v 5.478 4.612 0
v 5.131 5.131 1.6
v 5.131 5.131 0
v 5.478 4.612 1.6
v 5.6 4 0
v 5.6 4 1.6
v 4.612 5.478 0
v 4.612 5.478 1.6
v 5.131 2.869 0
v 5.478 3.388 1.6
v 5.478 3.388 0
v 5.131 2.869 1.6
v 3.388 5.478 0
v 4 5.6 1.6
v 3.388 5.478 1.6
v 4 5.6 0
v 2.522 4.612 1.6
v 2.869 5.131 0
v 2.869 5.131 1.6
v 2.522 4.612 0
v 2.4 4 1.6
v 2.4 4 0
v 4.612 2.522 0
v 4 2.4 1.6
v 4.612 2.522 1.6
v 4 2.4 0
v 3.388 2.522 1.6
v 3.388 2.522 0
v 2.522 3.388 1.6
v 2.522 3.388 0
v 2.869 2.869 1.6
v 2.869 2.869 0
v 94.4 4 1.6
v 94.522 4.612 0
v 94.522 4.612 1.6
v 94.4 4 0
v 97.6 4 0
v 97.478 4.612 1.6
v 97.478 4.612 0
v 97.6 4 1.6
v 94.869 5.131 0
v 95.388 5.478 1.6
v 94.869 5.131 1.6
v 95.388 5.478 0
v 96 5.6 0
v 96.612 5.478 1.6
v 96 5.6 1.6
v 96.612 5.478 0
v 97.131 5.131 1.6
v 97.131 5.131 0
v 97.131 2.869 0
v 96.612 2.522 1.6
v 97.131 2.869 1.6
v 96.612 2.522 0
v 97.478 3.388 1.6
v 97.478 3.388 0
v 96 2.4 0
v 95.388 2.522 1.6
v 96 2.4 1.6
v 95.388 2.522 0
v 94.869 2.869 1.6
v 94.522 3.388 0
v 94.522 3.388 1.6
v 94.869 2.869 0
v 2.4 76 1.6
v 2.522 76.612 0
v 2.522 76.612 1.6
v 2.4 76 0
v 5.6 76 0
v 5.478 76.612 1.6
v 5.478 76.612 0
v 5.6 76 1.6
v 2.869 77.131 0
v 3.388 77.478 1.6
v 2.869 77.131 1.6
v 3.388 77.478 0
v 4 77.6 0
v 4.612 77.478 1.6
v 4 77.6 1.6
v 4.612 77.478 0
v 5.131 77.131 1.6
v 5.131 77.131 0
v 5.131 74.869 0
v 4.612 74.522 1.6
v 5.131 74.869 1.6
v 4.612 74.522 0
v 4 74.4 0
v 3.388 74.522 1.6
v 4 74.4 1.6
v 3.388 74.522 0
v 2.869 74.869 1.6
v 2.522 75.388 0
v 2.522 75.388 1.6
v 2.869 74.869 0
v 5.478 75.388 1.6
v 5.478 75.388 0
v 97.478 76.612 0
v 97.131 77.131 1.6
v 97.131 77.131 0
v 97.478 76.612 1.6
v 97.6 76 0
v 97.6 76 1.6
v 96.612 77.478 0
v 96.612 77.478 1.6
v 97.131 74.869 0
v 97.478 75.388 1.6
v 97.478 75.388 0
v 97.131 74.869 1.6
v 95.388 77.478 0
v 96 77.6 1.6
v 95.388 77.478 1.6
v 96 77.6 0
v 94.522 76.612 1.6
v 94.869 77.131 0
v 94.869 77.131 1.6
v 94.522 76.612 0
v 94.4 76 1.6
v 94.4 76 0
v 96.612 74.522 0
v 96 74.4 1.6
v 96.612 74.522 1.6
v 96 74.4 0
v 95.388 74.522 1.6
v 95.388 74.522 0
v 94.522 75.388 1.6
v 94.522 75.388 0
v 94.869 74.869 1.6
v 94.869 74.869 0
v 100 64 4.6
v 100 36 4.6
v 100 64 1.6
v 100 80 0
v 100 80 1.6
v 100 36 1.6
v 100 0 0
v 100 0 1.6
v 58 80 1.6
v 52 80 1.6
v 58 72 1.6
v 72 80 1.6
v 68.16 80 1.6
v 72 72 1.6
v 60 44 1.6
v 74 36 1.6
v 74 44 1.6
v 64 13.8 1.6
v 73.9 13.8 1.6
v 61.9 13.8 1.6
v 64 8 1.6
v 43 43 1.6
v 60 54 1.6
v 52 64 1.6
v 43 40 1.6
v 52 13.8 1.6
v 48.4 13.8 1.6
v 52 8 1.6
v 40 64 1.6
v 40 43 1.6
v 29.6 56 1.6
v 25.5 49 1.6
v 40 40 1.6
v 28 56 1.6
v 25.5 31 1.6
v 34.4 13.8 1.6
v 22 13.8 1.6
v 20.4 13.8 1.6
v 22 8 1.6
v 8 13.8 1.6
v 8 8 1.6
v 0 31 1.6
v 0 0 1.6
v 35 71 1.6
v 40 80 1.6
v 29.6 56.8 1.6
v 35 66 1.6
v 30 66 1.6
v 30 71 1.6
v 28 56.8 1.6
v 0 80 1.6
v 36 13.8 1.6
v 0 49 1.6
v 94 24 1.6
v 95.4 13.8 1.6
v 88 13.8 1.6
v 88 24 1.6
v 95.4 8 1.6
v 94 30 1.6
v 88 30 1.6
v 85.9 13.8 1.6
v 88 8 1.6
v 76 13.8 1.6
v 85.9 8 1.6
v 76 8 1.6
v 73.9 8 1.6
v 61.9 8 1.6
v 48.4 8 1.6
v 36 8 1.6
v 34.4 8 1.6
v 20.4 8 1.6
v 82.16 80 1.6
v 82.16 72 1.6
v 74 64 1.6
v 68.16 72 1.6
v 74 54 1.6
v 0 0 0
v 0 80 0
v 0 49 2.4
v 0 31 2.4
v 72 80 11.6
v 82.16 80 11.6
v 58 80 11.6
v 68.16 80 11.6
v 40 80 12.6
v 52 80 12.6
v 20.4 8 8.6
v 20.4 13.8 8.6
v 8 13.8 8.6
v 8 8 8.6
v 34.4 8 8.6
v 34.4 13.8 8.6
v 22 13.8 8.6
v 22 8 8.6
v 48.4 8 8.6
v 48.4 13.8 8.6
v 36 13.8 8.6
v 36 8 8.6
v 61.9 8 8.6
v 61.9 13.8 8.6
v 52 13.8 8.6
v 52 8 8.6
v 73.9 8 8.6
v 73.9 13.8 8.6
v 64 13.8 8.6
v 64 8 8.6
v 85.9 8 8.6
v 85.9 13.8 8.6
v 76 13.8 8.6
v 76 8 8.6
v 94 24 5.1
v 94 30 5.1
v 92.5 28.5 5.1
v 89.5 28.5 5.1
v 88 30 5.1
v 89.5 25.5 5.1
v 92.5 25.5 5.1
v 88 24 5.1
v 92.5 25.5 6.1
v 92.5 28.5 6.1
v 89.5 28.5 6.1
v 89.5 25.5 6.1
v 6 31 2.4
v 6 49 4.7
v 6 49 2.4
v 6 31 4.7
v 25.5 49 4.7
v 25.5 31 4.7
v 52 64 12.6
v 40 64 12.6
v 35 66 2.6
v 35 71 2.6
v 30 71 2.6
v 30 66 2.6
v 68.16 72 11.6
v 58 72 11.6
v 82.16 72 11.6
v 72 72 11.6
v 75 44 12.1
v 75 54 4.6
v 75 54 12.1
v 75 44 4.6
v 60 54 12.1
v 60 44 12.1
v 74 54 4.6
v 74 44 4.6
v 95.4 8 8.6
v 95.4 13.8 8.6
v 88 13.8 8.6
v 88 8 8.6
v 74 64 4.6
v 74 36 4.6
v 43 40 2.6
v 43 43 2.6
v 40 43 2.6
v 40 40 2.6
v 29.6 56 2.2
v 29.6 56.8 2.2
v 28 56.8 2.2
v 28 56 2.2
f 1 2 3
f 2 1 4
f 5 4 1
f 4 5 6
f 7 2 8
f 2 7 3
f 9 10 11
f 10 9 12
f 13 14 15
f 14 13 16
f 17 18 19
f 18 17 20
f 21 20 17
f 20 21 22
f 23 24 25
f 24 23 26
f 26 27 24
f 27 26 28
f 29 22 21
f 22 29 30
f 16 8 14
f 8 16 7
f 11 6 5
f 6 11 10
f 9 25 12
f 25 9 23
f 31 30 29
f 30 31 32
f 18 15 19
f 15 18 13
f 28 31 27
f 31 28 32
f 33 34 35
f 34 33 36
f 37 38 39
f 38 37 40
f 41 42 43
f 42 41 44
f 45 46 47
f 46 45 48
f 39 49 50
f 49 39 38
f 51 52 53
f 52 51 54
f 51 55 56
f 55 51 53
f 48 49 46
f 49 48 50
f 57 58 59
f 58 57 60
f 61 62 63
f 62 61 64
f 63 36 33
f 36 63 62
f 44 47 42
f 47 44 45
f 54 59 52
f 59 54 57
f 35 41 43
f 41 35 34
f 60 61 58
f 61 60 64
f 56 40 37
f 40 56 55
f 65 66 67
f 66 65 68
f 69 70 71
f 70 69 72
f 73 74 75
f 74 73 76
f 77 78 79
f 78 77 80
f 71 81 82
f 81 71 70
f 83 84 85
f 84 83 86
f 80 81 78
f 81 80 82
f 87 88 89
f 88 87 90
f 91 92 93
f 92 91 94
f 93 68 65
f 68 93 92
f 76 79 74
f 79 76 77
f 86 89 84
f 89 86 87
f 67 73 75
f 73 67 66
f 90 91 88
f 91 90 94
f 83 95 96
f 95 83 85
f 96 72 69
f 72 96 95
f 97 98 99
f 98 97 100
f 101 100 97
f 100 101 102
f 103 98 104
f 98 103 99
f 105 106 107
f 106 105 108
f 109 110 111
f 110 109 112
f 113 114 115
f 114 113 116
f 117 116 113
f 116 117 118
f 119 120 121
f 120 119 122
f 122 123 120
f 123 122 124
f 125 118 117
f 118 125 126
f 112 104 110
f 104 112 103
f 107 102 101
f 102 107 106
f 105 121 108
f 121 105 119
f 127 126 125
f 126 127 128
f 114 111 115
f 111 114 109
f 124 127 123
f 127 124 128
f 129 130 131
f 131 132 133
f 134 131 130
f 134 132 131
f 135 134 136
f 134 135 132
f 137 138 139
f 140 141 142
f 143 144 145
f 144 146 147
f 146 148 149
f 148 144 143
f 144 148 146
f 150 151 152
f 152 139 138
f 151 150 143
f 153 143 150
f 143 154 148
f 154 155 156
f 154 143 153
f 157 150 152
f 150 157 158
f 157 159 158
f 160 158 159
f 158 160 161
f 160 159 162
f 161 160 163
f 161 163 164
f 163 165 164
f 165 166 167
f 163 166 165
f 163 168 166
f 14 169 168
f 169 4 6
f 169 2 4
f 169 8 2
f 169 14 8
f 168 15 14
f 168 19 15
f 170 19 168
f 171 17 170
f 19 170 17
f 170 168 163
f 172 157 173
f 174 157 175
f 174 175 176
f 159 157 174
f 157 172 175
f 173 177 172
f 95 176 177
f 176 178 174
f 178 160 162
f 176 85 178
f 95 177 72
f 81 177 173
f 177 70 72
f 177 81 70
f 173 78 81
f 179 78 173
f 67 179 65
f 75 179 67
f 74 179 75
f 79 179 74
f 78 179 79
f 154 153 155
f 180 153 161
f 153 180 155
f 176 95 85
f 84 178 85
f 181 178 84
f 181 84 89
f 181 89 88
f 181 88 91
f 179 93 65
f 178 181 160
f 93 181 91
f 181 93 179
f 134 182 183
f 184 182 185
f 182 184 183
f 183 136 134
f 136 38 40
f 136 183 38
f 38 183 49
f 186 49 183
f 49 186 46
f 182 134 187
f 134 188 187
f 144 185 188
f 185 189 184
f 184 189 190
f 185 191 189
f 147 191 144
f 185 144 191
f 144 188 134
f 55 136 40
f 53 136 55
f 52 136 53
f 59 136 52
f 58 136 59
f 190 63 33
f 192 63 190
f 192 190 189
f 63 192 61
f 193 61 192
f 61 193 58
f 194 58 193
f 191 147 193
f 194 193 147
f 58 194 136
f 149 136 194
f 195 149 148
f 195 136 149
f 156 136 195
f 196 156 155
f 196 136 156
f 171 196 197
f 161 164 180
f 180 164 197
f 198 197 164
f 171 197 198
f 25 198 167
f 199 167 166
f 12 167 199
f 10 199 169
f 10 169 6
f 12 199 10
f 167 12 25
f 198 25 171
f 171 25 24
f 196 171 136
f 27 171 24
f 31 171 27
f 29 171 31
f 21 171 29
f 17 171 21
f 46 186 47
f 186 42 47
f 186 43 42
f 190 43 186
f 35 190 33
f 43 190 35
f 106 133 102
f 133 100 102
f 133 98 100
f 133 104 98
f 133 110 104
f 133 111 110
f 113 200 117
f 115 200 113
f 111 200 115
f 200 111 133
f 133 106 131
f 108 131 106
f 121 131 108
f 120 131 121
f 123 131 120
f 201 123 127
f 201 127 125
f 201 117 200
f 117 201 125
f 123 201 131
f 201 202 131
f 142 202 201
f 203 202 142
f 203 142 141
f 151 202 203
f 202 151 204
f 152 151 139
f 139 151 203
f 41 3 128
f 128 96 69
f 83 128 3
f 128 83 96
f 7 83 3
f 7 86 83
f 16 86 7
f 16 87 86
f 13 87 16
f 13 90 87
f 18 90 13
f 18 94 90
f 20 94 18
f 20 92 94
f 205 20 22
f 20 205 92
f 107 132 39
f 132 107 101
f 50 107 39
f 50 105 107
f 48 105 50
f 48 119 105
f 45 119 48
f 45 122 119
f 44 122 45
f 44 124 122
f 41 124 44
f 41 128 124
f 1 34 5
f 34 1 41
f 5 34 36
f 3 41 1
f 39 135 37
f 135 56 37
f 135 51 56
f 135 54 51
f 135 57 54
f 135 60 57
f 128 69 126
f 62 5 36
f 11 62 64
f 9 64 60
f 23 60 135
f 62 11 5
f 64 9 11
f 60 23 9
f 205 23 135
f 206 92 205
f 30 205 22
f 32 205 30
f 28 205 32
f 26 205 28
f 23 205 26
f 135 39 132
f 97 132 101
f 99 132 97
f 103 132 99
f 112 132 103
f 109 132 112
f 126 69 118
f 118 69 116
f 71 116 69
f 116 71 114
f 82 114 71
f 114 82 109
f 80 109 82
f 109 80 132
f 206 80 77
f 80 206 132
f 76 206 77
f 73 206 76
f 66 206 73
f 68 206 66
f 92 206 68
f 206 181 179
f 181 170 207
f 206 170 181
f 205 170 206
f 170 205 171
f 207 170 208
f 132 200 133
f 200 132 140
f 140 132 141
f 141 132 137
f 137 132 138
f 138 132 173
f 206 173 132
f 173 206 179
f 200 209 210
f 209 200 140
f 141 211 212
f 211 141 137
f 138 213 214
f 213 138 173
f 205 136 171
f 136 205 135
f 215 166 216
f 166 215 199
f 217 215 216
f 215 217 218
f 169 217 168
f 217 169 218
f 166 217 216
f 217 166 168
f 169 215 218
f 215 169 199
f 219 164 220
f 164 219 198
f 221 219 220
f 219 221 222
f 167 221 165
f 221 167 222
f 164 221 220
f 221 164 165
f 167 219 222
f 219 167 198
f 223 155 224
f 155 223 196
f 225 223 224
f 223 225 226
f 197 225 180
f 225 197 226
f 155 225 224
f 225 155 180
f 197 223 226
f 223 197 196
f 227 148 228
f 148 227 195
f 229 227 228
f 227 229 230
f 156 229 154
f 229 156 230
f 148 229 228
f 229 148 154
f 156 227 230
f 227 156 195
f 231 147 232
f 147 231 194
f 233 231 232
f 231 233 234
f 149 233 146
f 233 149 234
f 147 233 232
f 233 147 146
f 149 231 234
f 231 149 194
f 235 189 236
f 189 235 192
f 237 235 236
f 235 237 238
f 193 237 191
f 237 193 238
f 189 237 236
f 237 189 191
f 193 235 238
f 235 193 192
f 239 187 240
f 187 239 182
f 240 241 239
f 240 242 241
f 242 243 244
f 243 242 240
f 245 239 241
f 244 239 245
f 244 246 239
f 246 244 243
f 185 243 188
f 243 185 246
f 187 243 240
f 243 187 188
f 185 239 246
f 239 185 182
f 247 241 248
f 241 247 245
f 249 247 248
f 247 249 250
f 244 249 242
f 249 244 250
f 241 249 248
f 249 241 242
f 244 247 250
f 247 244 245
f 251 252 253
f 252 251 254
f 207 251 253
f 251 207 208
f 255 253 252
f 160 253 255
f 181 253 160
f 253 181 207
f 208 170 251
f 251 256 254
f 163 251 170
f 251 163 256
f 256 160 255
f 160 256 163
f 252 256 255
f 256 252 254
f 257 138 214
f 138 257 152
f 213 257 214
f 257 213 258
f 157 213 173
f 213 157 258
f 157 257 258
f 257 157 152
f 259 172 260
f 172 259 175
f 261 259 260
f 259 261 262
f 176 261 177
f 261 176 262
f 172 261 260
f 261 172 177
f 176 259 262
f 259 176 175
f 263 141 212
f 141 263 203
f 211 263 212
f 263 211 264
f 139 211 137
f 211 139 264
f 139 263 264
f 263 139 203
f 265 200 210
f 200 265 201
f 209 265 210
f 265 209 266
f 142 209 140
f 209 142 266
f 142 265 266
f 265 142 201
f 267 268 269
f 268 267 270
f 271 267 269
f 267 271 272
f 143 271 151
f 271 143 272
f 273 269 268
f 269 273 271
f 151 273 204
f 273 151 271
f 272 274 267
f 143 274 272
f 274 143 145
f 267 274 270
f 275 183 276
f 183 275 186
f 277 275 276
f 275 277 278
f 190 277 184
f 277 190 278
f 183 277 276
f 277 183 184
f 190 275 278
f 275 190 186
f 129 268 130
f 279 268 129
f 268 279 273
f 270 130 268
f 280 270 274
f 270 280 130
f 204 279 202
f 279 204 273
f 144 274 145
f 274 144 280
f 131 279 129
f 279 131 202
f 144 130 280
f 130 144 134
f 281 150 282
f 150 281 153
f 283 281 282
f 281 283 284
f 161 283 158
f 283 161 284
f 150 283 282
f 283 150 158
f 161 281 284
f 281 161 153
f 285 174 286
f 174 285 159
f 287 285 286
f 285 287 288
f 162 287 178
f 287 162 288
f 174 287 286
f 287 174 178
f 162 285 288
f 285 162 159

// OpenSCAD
// file: ../board_common.scad
// What every board model here is made of: a PCB with holes, pin headers,
// chips and jacks, drawn from published dimensions. Nothing here is anyone's
// mesh; a board's outline, hole positions and connector placements are
// specifications the makers publish so that cases and shields can be made.
//
// Every board's origin is its PCB's front-left bottom corner (x right, y back,
// z up), with the PCB lying flat on z = 0 -- so a board placed at a node in
// a site sits on that node's floor, which is where a board sits on a bench.

pcb_t = 1.6;
pitch = 2.54;

module pcb(size, holes = [], hole_d = 3.2, col = "darkgreen") {
    color(col) difference() {
        cube([size.x, size.y, pcb_t]);
        for (h = holes) translate([h.x, h.y, -1]) cylinder(d = hole_d, h = pcb_t + 2, $fn = 16);
    }
}

// Pins are square posts that overlap what they stand in. OpenSCAD 2021.01
// exports a union with hexagonal pins, or with parts that only touch along
// an edge, as a mesh that is not closed -- and then drops it from any later
// union, silently. Every part here overlaps its neighbour by a little.
pin = 0.64;

// a row of `n` pins at the given start, along +x (or +y when `along_y`), with plastic bodies
module header(n, at, along_y = false, rows = 1, h = 8.5) {
    translate([at.x, at.y, pcb_t - 0.1]) rotate([0, 0, along_y ? 90 : 0]) translate([0, along_y ? -rows * pitch : 0, 0]) {
        color("black") cube([n * pitch, rows * pitch, h]);
        color("gold") for (i = [0 : n - 1]) for (r = [0 : rows - 1])
            translate([i * pitch + pitch / 2 - pin / 2, r * pitch + pitch / 2 - pin / 2, -3]) cube([pin, pin, h + 6]);
    }
}

// a row of `n` bare pins pointing down (a devkit standing on a breadboard).
// The pins are one gold strip, not n posts: n posts through a plastic bar
// under a PCB is a face with n holes, which OpenSCAD 2021.01 exports as a
// mesh CGAL will not read back. At bench scale a strip is a row of pins.
module pins_down(n, at, along_y = false, len = 11) {
    // one translate per solid, from the board's own frame: a chain of
    // translates with negative offsets rounds differently and the exporter
    // then writes a mesh CGAL will not read back (seen; not understood)
    rotate([0, 0, along_y ? 90 : 0]) {
        color("black") translate([at.x, at.y - pitch / 2, pcb_t - pitch]) cube([n * pitch, pitch, pitch + 0.1]);
        color("gold") translate([at.x + pitch / 2 - pin / 2, at.y - pin / 2, -len]) cube([(n - 1) * pitch + pin, pin, len + pcb_t - pitch + 0.2]);
    }
}

module chip(size, at, col = "black") { color(col) translate([at.x, at.y, pcb_t - 0.1]) cube([size.x, size.y, size.z + 0.1]); }

module usb_b(at) {           // a full-size USB-B jack, its face at the -x side
    color("silver") translate([at.x, at.y, pcb_t]) cube([16, 12, 11]);
}
module barrel_jack(at) {     // a 2.1 mm DC jack, its face at the -x side
    color("black") translate([at.x, at.y, pcb_t]) cube([14, 9, 11]);
}
module micro_usb(at, along_y = false) {
    color("silver") translate([at.x, at.y, pcb_t]) cube(along_y ? [8, 6, 3] : [6, 8, 3]);
}
module usb_c(at) { color("silver") translate([at.x, at.y, pcb_t]) cube([9, 7.5, 3.2]); }
module usb_a_stack(at) {     // two USB-A ports one above the other, the face at +x
    color("silver") translate([at.x, at.y, pcb_t]) cube([17.5, 13.2, 16]);
}
module rj45(at) { color("silver") translate([at.x, at.y, pcb_t]) cube([21.5, 16, 13.5]); }
module button(at) { color("silver") translate([at.x, at.y, pcb_t - 0.1]) cube([6, 6, 3.6]); color("black") translate([at.x + 1.5, at.y + 1.5, pcb_t + 3.4]) cube([3, 3, 1.1]); }
module crystal(at) { color("silver") translate([at.x, at.y, pcb_t]) cube([11, 4.5, 3.5]); }
module heatsink(at, size = [9, 9, 8]) { color("black") translate([at.x, at.y, pcb_t - 0.1]) cube([size.x, size.y, size.z + 4.1]); }
module screw_terminal(n, at, along_y = false) {
    translate([at.x, at.y, pcb_t]) rotate([0, 0, along_y ? 90 : 0]) color("mediumblue") cube([n * 5.08, 8, 10]);
}
module jst(n, at, along_y = false) {   // a JST-XH style header
    translate([at.x, at.y, pcb_t]) rotate([0, 0, along_y ? 90 : 0]) color("ivory") cube([n * 2.5 + 2.4, 5.8, 7]);
}
module sd_slot(at) { color("silver") translate([at.x, at.y, pcb_t]) cube([26, 28, 3]); }
// main file
// The controller board in an AnoleX 4060-Evo Ultra 2's control box: an ESP32
// running Grbl_ESP32 (it reports as Grbl 1.3a) behind a CH340 USB bridge,
// which is what the bench saw of it. The maker publishes no drawing of the
// board, so the rest is assumed, and README.md beside this file says which:
// a 100 x 80 mm PCB with four mounting holes, the ESP32-WROOM-32 module with
// its antenna at the left edge, the USB-B jack at the back edge with the CH340
// beside it, the 24 V input and the spindle's screw terminals along the same
// edge, three driver headers along the front (X, Y, Z: the closed-loop NEMA 23
// steppers have drivers of their own, so the board sends step and direction),
// the limit switch and probe headers beside them, the SD slot (ESP3D's) at the
// right edge, the spindle relay and a reset button. The node a router's serial
// port is pinned to.

include <../board_common.scad>

size = [100, 80];   // assumed: a board of this kind, standing in a 200 x 100 mm control box
holes = [[4, 4], [96, 4], [4, 76], [96, 76]];

module anolex_grbl_esp32() {
    pcb(size, holes, hole_d = 3.2, col = "darkgreen");
    // the ESP32-WROOM-32 module, its can and its antenna, at the left edge
    color("black") translate([0, 31, pcb_t]) cube([6, 18, 0.8]);
    color("silver") translate([6, 31, pcb_t]) cube([19.5, 18, 3.1]);
    // the USB-B jack at the back edge, its face to the rear as the box's socket is
    color("silver") translate([40, 64, pcb_t]) cube([12, 16, 11]);
    chip([5, 5, 1], [30, 66]);                                  // the CH340
    screw_terminal(2, [58, 72]);                                // 24 V in
    screw_terminal(2, [72, 72]);                                // the spindle
    chip([15, 10, 10.5], [60, 44], "midnightblue");             // the spindle relay
    for (i = [0 : 2]) jst(4, [8 + i * 14, 8]);                  // X, Y, Z: step and direction to the drivers
    for (i = [0 : 2]) jst(3, [52 + i * 12, 8]);                 // the limit switches
    jst(2, [88, 8]);                                            // the probe
    sd_slot([74, 36]);
    button([88, 24]);                                           // reset
    chip([3, 3, 1], [40, 40], "dimgray");                       // the LDO
    chip([1.6, 0.8, 0.6], [28, 56], "red");                     // the power LED
}

anolex_grbl_esp32();
